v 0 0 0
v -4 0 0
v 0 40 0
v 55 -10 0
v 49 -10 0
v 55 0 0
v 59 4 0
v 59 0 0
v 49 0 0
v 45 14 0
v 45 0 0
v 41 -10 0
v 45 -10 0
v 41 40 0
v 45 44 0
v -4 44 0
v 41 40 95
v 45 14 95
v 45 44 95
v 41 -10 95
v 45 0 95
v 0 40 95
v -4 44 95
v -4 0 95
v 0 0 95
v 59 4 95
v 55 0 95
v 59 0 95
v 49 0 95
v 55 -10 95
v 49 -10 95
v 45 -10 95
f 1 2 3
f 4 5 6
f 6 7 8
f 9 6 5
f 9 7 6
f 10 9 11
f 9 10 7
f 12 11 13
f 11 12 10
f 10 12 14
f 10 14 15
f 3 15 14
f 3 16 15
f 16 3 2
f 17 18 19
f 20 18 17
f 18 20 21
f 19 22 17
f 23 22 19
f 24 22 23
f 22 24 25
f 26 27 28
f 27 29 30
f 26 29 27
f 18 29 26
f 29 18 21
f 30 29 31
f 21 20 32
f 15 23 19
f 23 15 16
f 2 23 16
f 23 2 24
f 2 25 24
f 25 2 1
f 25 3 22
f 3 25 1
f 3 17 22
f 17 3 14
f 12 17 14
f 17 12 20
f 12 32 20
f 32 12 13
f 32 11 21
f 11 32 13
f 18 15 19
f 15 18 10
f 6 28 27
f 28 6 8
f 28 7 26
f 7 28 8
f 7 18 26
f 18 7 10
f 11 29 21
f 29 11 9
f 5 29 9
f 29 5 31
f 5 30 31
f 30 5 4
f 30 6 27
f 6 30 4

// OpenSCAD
// Medidas en mm
ancho_tubo    = 41;
alto_tubo     = 40;
alto_enganche = 10;

// Pieza
grosor_pieza = 4;
extrusion = 95;

union() {
    linear_extrude(height = extrusion)
        polygon(points=[
            [0                        , 0                     ],
            [0                        , alto_tubo             ],
            [ancho_tubo               , alto_tubo             ],
            [ancho_tubo               , -alto_enganche        ],     
            [ancho_tubo + grosor_pieza, -alto_enganche        ],
            [ancho_tubo + grosor_pieza, alto_tubo+grosor_pieza],
            [-grosor_pieza            , alto_tubo+grosor_pieza],
            [-grosor_pieza            , 0                     ]
        ]); 
         
    linear_extrude(height = extrusion)     
        translate([ancho_tubo + grosor_pieza, 0])
            rotate([180, 0, 0])
                polygon(points=[
                    [0                           , 0 ],
                    [grosor_pieza                , 0 ], 
                    [grosor_pieza                , alto_enganche], 
                    [alto_enganche               , alto_enganche], 
                    [alto_enganche               , 0 ], 
                    [alto_enganche + grosor_pieza, 0 ], 
                    [alto_enganche + grosor_pieza, -grosor_pieza], 
                    [0                           , -grosor_pieza-10]
                ]);
} 
 
